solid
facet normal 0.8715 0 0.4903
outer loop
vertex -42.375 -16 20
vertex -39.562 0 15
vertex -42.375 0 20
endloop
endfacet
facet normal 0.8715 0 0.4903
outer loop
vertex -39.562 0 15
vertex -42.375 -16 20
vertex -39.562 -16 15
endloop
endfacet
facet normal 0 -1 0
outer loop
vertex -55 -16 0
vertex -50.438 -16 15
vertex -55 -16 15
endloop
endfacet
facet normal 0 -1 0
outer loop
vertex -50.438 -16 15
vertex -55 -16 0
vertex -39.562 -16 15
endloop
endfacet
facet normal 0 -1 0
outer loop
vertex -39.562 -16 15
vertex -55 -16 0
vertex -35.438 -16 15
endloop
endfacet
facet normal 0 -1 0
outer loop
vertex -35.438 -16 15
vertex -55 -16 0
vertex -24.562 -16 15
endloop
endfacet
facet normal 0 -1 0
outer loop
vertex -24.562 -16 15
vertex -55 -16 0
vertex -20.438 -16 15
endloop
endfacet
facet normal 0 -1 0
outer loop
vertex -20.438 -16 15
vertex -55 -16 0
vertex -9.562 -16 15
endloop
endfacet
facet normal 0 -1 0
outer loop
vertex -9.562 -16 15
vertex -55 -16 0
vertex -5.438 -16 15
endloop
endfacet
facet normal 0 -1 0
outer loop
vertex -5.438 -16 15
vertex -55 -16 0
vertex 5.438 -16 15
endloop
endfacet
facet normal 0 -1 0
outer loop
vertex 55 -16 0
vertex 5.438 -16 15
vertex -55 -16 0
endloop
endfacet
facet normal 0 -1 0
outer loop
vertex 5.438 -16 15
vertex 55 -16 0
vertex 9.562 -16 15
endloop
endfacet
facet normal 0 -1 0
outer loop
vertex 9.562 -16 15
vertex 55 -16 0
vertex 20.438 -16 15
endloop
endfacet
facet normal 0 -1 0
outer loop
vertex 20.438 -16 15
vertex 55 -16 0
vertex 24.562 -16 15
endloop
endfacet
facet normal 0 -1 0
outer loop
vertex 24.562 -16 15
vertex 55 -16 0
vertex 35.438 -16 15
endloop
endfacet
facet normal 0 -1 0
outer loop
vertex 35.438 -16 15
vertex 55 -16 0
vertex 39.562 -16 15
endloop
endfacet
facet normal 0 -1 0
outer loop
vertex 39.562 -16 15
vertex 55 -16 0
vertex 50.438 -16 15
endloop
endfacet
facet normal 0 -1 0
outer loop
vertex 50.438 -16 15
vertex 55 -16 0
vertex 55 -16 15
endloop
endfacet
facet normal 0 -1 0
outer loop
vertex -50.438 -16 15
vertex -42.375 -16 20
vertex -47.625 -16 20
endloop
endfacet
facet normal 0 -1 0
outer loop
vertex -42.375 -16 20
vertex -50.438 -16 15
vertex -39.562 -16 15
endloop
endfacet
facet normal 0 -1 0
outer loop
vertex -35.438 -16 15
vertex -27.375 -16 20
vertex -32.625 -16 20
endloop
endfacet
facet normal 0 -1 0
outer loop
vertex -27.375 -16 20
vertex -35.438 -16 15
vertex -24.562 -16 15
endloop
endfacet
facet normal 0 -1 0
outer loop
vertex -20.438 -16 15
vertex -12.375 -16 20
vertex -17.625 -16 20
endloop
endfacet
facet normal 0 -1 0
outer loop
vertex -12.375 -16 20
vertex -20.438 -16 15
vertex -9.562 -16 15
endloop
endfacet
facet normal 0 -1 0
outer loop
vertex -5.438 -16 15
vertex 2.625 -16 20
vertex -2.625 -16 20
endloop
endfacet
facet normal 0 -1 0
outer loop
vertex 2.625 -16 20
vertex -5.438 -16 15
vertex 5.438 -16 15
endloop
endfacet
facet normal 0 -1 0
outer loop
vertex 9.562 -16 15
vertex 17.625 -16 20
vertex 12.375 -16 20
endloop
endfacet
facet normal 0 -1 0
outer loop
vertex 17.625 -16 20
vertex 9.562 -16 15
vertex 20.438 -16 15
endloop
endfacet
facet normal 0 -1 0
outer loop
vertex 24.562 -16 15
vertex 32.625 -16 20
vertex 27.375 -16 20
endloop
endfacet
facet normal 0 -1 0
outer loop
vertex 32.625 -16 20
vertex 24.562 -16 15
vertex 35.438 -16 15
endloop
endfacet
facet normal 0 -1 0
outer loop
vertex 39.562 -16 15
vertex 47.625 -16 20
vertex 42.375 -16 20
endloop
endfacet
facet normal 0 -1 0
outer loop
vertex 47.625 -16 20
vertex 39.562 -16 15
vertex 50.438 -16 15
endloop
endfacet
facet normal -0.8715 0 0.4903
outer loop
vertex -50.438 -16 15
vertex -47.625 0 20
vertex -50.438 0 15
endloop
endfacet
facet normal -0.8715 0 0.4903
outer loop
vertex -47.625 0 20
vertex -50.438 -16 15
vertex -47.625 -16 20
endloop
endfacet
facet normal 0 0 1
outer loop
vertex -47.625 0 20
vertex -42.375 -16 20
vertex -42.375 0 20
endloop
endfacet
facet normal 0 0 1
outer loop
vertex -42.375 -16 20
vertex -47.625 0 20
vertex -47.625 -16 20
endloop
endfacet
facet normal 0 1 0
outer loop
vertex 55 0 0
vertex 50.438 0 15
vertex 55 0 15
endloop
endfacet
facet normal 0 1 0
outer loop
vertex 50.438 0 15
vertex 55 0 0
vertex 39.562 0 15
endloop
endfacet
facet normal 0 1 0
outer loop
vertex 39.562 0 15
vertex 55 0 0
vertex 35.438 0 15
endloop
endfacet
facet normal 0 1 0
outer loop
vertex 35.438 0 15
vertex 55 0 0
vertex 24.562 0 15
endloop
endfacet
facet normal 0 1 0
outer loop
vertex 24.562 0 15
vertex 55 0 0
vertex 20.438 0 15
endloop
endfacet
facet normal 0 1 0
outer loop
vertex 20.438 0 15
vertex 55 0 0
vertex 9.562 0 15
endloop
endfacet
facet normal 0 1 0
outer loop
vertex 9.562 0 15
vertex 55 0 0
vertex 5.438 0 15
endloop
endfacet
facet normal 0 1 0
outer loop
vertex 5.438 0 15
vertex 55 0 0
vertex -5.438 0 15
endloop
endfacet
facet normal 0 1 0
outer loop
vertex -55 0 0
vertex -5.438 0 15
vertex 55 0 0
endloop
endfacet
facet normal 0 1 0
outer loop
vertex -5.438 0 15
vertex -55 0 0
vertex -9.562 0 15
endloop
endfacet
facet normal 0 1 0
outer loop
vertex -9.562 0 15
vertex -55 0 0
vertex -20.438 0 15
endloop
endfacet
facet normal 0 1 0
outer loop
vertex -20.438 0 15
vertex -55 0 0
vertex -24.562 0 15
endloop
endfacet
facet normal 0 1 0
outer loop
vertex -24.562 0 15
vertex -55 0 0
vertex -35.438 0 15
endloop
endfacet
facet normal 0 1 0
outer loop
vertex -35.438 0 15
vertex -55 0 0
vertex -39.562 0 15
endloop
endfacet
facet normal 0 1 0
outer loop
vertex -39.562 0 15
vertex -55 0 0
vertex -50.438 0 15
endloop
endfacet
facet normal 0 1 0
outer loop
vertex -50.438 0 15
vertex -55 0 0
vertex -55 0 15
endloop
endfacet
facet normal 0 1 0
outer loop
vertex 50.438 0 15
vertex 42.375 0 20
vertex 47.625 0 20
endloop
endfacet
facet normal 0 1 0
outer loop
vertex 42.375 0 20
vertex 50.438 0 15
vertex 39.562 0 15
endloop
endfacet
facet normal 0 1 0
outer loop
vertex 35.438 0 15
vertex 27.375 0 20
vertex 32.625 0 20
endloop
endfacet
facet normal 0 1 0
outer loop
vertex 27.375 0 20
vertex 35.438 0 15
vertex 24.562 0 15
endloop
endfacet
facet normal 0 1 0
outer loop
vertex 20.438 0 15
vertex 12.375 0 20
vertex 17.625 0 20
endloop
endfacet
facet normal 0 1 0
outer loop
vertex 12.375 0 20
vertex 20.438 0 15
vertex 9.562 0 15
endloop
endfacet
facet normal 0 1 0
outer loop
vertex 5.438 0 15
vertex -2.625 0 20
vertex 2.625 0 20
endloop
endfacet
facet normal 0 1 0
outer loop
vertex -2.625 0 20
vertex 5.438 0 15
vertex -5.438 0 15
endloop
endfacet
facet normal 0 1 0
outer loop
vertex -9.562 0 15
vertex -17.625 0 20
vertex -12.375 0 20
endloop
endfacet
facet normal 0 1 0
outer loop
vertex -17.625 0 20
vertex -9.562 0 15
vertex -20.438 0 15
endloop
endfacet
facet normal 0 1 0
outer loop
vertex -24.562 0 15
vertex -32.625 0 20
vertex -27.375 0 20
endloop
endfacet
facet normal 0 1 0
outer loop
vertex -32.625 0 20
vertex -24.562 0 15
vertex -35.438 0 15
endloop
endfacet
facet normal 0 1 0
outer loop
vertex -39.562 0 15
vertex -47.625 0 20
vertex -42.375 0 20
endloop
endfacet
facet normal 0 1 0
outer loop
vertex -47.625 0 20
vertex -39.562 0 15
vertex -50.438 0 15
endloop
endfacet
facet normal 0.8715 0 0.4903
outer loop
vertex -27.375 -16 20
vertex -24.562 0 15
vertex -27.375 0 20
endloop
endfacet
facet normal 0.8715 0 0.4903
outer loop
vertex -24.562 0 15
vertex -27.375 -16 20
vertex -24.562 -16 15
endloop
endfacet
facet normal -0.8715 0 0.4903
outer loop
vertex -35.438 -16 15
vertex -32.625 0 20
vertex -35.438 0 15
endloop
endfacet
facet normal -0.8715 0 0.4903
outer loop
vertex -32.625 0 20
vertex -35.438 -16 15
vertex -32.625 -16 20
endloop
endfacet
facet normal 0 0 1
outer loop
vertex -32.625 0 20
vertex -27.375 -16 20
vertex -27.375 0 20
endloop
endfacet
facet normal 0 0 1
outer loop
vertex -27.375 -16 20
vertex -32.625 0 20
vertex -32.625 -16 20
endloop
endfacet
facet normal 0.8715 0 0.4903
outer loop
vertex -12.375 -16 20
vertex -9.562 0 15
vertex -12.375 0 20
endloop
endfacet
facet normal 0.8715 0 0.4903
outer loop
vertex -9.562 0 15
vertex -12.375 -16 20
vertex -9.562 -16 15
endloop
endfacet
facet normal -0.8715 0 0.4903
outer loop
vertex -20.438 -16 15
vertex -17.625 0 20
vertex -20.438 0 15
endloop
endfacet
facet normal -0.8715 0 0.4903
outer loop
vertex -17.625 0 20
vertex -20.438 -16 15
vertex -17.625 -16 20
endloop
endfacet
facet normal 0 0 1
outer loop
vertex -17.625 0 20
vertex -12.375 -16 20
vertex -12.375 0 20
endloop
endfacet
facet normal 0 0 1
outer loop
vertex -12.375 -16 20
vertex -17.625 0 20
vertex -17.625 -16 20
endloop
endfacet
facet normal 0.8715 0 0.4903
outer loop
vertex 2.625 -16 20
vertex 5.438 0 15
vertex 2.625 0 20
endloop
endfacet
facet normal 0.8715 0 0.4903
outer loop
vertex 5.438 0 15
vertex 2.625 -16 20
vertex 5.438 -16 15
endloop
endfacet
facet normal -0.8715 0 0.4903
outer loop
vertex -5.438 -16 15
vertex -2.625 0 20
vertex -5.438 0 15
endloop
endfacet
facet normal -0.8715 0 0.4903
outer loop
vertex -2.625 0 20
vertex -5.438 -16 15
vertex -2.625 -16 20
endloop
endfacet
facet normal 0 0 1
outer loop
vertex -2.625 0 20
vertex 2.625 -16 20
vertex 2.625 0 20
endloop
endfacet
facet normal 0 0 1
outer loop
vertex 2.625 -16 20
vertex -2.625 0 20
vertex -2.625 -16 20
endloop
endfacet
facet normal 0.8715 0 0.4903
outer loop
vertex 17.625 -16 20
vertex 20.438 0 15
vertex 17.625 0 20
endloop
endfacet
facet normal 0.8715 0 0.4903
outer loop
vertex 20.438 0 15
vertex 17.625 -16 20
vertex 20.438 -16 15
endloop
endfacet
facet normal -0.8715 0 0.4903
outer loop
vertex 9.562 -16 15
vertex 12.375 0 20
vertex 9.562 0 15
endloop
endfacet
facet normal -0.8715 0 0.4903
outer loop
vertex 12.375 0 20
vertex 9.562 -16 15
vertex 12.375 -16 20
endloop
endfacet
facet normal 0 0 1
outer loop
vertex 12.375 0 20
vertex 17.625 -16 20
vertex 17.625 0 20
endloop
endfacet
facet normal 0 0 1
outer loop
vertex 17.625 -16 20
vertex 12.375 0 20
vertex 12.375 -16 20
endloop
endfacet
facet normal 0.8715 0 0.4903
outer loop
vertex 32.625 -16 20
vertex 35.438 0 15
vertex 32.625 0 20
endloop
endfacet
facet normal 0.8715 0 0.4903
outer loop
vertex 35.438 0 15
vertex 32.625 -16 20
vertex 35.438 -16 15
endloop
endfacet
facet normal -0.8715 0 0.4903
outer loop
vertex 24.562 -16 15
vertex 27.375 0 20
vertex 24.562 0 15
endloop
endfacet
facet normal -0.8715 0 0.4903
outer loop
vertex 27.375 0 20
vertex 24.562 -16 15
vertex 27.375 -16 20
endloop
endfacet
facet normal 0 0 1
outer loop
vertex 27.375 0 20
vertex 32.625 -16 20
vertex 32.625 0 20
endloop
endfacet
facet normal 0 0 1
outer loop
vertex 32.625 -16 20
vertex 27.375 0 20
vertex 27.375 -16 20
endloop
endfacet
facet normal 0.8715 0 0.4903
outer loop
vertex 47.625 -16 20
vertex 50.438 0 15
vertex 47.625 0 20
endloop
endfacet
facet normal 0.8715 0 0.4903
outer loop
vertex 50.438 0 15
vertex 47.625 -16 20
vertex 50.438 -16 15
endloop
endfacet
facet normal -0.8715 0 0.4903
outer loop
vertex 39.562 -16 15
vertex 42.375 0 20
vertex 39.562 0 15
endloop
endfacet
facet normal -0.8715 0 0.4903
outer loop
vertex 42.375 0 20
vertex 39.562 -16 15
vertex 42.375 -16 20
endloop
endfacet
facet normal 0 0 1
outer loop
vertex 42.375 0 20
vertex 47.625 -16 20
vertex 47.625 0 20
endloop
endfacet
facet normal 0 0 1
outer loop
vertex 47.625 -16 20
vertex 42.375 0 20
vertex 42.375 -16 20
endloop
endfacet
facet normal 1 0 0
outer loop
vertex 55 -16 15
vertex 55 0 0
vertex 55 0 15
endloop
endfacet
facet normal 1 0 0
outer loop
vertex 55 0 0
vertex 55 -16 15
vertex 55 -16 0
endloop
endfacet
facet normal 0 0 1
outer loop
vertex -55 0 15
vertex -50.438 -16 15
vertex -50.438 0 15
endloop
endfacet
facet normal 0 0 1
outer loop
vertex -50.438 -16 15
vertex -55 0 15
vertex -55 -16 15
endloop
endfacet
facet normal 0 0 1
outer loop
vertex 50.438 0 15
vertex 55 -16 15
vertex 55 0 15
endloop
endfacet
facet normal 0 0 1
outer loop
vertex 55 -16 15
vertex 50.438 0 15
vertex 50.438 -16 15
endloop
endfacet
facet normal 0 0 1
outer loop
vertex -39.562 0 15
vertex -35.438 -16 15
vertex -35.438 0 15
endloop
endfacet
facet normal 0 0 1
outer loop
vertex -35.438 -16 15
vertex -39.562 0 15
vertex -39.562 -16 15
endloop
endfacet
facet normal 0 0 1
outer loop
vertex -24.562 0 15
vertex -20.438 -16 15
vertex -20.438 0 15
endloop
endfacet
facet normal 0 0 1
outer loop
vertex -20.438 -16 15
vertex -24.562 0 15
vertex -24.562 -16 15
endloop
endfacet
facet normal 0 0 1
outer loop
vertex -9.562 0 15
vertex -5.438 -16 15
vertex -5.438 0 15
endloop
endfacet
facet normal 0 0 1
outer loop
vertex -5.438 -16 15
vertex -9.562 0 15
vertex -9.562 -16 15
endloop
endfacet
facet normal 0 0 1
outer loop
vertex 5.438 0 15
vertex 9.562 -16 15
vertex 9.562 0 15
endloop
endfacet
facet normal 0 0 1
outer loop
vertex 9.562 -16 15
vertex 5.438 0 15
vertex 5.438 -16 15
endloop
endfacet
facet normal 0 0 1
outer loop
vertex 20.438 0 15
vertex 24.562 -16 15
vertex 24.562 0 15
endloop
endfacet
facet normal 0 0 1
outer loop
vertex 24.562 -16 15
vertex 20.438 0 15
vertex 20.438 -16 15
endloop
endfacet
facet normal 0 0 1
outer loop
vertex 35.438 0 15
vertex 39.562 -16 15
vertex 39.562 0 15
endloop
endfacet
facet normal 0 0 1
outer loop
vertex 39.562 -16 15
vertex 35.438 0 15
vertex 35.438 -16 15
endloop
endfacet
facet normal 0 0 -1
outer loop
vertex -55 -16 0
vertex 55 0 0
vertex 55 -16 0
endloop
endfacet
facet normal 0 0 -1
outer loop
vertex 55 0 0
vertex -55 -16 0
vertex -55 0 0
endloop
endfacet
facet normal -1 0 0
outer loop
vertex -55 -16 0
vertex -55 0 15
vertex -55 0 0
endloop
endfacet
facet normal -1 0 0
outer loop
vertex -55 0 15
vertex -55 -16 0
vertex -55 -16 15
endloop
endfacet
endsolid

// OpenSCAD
$fn = 32;

// ----------------------------------------------------------------------
// Toothed rack, 7 teeth
// 15 mm pitch, 5 mm teeth
// ----------------------------------------------------------------------

// --- parameters (mm) ---
bar_w = 16;      // bar width (Y)
bar_h = 15;      // bar height (Z)
teeth = 7;       // number of teeth
pitch = 15;      // tooth pitch
tooth_h = 5;     // tooth height above the bar
root_w = 12;     // tooth width at the root
crest_w = 5.25;  // tooth width at the crest

// --- derived feature positions (mm) ---
span = (teeth - 1) * pitch;  // = 90   distance between the outer teeth
bar_l = span + root_w + 8;   // = 110   bar length: teeth plus 4 mm at each end
tooth_x = -span / 2;         // = -45   X of the first tooth
height = bar_h + tooth_h;    // = 20   overall height
feature_centers = [
  [tooth_x + 0 * pitch, -bar_w / 2],
  [tooth_x + 1 * pitch, -bar_w / 2],
  [tooth_x + 2 * pitch, -bar_w / 2],
  [tooth_x + 3 * pitch, -bar_w / 2],
  [tooth_x + 4 * pitch, -bar_w / 2],
  [tooth_x + 5 * pitch, -bar_w / 2],
  [tooth_x + 6 * pitch, -bar_w / 2]
];   // tooth centre line, drives the tooth loop

// bar with a rack of teeth, one extruded trapezoium per centre
module rack_tooth() {
  linear_extrude(height = bar_w)
    polygon(points = [
      [0, 0],
      [root_w, 0],
      [root_w / 2 + crest_w / 2, tooth_h + 1],
      [root_w / 2 - crest_w / 2, tooth_h + 1]
    ]);
}

union() {
  translate([-bar_l / 2, -bar_w, 0]) cube([bar_l, bar_w, bar_h]);
  for (centre = feature_centers)
    translate([centre[0] - root_w / 2, 0, bar_h - 1]) rotate([90, 0, 0]) rack_tooth();
}
